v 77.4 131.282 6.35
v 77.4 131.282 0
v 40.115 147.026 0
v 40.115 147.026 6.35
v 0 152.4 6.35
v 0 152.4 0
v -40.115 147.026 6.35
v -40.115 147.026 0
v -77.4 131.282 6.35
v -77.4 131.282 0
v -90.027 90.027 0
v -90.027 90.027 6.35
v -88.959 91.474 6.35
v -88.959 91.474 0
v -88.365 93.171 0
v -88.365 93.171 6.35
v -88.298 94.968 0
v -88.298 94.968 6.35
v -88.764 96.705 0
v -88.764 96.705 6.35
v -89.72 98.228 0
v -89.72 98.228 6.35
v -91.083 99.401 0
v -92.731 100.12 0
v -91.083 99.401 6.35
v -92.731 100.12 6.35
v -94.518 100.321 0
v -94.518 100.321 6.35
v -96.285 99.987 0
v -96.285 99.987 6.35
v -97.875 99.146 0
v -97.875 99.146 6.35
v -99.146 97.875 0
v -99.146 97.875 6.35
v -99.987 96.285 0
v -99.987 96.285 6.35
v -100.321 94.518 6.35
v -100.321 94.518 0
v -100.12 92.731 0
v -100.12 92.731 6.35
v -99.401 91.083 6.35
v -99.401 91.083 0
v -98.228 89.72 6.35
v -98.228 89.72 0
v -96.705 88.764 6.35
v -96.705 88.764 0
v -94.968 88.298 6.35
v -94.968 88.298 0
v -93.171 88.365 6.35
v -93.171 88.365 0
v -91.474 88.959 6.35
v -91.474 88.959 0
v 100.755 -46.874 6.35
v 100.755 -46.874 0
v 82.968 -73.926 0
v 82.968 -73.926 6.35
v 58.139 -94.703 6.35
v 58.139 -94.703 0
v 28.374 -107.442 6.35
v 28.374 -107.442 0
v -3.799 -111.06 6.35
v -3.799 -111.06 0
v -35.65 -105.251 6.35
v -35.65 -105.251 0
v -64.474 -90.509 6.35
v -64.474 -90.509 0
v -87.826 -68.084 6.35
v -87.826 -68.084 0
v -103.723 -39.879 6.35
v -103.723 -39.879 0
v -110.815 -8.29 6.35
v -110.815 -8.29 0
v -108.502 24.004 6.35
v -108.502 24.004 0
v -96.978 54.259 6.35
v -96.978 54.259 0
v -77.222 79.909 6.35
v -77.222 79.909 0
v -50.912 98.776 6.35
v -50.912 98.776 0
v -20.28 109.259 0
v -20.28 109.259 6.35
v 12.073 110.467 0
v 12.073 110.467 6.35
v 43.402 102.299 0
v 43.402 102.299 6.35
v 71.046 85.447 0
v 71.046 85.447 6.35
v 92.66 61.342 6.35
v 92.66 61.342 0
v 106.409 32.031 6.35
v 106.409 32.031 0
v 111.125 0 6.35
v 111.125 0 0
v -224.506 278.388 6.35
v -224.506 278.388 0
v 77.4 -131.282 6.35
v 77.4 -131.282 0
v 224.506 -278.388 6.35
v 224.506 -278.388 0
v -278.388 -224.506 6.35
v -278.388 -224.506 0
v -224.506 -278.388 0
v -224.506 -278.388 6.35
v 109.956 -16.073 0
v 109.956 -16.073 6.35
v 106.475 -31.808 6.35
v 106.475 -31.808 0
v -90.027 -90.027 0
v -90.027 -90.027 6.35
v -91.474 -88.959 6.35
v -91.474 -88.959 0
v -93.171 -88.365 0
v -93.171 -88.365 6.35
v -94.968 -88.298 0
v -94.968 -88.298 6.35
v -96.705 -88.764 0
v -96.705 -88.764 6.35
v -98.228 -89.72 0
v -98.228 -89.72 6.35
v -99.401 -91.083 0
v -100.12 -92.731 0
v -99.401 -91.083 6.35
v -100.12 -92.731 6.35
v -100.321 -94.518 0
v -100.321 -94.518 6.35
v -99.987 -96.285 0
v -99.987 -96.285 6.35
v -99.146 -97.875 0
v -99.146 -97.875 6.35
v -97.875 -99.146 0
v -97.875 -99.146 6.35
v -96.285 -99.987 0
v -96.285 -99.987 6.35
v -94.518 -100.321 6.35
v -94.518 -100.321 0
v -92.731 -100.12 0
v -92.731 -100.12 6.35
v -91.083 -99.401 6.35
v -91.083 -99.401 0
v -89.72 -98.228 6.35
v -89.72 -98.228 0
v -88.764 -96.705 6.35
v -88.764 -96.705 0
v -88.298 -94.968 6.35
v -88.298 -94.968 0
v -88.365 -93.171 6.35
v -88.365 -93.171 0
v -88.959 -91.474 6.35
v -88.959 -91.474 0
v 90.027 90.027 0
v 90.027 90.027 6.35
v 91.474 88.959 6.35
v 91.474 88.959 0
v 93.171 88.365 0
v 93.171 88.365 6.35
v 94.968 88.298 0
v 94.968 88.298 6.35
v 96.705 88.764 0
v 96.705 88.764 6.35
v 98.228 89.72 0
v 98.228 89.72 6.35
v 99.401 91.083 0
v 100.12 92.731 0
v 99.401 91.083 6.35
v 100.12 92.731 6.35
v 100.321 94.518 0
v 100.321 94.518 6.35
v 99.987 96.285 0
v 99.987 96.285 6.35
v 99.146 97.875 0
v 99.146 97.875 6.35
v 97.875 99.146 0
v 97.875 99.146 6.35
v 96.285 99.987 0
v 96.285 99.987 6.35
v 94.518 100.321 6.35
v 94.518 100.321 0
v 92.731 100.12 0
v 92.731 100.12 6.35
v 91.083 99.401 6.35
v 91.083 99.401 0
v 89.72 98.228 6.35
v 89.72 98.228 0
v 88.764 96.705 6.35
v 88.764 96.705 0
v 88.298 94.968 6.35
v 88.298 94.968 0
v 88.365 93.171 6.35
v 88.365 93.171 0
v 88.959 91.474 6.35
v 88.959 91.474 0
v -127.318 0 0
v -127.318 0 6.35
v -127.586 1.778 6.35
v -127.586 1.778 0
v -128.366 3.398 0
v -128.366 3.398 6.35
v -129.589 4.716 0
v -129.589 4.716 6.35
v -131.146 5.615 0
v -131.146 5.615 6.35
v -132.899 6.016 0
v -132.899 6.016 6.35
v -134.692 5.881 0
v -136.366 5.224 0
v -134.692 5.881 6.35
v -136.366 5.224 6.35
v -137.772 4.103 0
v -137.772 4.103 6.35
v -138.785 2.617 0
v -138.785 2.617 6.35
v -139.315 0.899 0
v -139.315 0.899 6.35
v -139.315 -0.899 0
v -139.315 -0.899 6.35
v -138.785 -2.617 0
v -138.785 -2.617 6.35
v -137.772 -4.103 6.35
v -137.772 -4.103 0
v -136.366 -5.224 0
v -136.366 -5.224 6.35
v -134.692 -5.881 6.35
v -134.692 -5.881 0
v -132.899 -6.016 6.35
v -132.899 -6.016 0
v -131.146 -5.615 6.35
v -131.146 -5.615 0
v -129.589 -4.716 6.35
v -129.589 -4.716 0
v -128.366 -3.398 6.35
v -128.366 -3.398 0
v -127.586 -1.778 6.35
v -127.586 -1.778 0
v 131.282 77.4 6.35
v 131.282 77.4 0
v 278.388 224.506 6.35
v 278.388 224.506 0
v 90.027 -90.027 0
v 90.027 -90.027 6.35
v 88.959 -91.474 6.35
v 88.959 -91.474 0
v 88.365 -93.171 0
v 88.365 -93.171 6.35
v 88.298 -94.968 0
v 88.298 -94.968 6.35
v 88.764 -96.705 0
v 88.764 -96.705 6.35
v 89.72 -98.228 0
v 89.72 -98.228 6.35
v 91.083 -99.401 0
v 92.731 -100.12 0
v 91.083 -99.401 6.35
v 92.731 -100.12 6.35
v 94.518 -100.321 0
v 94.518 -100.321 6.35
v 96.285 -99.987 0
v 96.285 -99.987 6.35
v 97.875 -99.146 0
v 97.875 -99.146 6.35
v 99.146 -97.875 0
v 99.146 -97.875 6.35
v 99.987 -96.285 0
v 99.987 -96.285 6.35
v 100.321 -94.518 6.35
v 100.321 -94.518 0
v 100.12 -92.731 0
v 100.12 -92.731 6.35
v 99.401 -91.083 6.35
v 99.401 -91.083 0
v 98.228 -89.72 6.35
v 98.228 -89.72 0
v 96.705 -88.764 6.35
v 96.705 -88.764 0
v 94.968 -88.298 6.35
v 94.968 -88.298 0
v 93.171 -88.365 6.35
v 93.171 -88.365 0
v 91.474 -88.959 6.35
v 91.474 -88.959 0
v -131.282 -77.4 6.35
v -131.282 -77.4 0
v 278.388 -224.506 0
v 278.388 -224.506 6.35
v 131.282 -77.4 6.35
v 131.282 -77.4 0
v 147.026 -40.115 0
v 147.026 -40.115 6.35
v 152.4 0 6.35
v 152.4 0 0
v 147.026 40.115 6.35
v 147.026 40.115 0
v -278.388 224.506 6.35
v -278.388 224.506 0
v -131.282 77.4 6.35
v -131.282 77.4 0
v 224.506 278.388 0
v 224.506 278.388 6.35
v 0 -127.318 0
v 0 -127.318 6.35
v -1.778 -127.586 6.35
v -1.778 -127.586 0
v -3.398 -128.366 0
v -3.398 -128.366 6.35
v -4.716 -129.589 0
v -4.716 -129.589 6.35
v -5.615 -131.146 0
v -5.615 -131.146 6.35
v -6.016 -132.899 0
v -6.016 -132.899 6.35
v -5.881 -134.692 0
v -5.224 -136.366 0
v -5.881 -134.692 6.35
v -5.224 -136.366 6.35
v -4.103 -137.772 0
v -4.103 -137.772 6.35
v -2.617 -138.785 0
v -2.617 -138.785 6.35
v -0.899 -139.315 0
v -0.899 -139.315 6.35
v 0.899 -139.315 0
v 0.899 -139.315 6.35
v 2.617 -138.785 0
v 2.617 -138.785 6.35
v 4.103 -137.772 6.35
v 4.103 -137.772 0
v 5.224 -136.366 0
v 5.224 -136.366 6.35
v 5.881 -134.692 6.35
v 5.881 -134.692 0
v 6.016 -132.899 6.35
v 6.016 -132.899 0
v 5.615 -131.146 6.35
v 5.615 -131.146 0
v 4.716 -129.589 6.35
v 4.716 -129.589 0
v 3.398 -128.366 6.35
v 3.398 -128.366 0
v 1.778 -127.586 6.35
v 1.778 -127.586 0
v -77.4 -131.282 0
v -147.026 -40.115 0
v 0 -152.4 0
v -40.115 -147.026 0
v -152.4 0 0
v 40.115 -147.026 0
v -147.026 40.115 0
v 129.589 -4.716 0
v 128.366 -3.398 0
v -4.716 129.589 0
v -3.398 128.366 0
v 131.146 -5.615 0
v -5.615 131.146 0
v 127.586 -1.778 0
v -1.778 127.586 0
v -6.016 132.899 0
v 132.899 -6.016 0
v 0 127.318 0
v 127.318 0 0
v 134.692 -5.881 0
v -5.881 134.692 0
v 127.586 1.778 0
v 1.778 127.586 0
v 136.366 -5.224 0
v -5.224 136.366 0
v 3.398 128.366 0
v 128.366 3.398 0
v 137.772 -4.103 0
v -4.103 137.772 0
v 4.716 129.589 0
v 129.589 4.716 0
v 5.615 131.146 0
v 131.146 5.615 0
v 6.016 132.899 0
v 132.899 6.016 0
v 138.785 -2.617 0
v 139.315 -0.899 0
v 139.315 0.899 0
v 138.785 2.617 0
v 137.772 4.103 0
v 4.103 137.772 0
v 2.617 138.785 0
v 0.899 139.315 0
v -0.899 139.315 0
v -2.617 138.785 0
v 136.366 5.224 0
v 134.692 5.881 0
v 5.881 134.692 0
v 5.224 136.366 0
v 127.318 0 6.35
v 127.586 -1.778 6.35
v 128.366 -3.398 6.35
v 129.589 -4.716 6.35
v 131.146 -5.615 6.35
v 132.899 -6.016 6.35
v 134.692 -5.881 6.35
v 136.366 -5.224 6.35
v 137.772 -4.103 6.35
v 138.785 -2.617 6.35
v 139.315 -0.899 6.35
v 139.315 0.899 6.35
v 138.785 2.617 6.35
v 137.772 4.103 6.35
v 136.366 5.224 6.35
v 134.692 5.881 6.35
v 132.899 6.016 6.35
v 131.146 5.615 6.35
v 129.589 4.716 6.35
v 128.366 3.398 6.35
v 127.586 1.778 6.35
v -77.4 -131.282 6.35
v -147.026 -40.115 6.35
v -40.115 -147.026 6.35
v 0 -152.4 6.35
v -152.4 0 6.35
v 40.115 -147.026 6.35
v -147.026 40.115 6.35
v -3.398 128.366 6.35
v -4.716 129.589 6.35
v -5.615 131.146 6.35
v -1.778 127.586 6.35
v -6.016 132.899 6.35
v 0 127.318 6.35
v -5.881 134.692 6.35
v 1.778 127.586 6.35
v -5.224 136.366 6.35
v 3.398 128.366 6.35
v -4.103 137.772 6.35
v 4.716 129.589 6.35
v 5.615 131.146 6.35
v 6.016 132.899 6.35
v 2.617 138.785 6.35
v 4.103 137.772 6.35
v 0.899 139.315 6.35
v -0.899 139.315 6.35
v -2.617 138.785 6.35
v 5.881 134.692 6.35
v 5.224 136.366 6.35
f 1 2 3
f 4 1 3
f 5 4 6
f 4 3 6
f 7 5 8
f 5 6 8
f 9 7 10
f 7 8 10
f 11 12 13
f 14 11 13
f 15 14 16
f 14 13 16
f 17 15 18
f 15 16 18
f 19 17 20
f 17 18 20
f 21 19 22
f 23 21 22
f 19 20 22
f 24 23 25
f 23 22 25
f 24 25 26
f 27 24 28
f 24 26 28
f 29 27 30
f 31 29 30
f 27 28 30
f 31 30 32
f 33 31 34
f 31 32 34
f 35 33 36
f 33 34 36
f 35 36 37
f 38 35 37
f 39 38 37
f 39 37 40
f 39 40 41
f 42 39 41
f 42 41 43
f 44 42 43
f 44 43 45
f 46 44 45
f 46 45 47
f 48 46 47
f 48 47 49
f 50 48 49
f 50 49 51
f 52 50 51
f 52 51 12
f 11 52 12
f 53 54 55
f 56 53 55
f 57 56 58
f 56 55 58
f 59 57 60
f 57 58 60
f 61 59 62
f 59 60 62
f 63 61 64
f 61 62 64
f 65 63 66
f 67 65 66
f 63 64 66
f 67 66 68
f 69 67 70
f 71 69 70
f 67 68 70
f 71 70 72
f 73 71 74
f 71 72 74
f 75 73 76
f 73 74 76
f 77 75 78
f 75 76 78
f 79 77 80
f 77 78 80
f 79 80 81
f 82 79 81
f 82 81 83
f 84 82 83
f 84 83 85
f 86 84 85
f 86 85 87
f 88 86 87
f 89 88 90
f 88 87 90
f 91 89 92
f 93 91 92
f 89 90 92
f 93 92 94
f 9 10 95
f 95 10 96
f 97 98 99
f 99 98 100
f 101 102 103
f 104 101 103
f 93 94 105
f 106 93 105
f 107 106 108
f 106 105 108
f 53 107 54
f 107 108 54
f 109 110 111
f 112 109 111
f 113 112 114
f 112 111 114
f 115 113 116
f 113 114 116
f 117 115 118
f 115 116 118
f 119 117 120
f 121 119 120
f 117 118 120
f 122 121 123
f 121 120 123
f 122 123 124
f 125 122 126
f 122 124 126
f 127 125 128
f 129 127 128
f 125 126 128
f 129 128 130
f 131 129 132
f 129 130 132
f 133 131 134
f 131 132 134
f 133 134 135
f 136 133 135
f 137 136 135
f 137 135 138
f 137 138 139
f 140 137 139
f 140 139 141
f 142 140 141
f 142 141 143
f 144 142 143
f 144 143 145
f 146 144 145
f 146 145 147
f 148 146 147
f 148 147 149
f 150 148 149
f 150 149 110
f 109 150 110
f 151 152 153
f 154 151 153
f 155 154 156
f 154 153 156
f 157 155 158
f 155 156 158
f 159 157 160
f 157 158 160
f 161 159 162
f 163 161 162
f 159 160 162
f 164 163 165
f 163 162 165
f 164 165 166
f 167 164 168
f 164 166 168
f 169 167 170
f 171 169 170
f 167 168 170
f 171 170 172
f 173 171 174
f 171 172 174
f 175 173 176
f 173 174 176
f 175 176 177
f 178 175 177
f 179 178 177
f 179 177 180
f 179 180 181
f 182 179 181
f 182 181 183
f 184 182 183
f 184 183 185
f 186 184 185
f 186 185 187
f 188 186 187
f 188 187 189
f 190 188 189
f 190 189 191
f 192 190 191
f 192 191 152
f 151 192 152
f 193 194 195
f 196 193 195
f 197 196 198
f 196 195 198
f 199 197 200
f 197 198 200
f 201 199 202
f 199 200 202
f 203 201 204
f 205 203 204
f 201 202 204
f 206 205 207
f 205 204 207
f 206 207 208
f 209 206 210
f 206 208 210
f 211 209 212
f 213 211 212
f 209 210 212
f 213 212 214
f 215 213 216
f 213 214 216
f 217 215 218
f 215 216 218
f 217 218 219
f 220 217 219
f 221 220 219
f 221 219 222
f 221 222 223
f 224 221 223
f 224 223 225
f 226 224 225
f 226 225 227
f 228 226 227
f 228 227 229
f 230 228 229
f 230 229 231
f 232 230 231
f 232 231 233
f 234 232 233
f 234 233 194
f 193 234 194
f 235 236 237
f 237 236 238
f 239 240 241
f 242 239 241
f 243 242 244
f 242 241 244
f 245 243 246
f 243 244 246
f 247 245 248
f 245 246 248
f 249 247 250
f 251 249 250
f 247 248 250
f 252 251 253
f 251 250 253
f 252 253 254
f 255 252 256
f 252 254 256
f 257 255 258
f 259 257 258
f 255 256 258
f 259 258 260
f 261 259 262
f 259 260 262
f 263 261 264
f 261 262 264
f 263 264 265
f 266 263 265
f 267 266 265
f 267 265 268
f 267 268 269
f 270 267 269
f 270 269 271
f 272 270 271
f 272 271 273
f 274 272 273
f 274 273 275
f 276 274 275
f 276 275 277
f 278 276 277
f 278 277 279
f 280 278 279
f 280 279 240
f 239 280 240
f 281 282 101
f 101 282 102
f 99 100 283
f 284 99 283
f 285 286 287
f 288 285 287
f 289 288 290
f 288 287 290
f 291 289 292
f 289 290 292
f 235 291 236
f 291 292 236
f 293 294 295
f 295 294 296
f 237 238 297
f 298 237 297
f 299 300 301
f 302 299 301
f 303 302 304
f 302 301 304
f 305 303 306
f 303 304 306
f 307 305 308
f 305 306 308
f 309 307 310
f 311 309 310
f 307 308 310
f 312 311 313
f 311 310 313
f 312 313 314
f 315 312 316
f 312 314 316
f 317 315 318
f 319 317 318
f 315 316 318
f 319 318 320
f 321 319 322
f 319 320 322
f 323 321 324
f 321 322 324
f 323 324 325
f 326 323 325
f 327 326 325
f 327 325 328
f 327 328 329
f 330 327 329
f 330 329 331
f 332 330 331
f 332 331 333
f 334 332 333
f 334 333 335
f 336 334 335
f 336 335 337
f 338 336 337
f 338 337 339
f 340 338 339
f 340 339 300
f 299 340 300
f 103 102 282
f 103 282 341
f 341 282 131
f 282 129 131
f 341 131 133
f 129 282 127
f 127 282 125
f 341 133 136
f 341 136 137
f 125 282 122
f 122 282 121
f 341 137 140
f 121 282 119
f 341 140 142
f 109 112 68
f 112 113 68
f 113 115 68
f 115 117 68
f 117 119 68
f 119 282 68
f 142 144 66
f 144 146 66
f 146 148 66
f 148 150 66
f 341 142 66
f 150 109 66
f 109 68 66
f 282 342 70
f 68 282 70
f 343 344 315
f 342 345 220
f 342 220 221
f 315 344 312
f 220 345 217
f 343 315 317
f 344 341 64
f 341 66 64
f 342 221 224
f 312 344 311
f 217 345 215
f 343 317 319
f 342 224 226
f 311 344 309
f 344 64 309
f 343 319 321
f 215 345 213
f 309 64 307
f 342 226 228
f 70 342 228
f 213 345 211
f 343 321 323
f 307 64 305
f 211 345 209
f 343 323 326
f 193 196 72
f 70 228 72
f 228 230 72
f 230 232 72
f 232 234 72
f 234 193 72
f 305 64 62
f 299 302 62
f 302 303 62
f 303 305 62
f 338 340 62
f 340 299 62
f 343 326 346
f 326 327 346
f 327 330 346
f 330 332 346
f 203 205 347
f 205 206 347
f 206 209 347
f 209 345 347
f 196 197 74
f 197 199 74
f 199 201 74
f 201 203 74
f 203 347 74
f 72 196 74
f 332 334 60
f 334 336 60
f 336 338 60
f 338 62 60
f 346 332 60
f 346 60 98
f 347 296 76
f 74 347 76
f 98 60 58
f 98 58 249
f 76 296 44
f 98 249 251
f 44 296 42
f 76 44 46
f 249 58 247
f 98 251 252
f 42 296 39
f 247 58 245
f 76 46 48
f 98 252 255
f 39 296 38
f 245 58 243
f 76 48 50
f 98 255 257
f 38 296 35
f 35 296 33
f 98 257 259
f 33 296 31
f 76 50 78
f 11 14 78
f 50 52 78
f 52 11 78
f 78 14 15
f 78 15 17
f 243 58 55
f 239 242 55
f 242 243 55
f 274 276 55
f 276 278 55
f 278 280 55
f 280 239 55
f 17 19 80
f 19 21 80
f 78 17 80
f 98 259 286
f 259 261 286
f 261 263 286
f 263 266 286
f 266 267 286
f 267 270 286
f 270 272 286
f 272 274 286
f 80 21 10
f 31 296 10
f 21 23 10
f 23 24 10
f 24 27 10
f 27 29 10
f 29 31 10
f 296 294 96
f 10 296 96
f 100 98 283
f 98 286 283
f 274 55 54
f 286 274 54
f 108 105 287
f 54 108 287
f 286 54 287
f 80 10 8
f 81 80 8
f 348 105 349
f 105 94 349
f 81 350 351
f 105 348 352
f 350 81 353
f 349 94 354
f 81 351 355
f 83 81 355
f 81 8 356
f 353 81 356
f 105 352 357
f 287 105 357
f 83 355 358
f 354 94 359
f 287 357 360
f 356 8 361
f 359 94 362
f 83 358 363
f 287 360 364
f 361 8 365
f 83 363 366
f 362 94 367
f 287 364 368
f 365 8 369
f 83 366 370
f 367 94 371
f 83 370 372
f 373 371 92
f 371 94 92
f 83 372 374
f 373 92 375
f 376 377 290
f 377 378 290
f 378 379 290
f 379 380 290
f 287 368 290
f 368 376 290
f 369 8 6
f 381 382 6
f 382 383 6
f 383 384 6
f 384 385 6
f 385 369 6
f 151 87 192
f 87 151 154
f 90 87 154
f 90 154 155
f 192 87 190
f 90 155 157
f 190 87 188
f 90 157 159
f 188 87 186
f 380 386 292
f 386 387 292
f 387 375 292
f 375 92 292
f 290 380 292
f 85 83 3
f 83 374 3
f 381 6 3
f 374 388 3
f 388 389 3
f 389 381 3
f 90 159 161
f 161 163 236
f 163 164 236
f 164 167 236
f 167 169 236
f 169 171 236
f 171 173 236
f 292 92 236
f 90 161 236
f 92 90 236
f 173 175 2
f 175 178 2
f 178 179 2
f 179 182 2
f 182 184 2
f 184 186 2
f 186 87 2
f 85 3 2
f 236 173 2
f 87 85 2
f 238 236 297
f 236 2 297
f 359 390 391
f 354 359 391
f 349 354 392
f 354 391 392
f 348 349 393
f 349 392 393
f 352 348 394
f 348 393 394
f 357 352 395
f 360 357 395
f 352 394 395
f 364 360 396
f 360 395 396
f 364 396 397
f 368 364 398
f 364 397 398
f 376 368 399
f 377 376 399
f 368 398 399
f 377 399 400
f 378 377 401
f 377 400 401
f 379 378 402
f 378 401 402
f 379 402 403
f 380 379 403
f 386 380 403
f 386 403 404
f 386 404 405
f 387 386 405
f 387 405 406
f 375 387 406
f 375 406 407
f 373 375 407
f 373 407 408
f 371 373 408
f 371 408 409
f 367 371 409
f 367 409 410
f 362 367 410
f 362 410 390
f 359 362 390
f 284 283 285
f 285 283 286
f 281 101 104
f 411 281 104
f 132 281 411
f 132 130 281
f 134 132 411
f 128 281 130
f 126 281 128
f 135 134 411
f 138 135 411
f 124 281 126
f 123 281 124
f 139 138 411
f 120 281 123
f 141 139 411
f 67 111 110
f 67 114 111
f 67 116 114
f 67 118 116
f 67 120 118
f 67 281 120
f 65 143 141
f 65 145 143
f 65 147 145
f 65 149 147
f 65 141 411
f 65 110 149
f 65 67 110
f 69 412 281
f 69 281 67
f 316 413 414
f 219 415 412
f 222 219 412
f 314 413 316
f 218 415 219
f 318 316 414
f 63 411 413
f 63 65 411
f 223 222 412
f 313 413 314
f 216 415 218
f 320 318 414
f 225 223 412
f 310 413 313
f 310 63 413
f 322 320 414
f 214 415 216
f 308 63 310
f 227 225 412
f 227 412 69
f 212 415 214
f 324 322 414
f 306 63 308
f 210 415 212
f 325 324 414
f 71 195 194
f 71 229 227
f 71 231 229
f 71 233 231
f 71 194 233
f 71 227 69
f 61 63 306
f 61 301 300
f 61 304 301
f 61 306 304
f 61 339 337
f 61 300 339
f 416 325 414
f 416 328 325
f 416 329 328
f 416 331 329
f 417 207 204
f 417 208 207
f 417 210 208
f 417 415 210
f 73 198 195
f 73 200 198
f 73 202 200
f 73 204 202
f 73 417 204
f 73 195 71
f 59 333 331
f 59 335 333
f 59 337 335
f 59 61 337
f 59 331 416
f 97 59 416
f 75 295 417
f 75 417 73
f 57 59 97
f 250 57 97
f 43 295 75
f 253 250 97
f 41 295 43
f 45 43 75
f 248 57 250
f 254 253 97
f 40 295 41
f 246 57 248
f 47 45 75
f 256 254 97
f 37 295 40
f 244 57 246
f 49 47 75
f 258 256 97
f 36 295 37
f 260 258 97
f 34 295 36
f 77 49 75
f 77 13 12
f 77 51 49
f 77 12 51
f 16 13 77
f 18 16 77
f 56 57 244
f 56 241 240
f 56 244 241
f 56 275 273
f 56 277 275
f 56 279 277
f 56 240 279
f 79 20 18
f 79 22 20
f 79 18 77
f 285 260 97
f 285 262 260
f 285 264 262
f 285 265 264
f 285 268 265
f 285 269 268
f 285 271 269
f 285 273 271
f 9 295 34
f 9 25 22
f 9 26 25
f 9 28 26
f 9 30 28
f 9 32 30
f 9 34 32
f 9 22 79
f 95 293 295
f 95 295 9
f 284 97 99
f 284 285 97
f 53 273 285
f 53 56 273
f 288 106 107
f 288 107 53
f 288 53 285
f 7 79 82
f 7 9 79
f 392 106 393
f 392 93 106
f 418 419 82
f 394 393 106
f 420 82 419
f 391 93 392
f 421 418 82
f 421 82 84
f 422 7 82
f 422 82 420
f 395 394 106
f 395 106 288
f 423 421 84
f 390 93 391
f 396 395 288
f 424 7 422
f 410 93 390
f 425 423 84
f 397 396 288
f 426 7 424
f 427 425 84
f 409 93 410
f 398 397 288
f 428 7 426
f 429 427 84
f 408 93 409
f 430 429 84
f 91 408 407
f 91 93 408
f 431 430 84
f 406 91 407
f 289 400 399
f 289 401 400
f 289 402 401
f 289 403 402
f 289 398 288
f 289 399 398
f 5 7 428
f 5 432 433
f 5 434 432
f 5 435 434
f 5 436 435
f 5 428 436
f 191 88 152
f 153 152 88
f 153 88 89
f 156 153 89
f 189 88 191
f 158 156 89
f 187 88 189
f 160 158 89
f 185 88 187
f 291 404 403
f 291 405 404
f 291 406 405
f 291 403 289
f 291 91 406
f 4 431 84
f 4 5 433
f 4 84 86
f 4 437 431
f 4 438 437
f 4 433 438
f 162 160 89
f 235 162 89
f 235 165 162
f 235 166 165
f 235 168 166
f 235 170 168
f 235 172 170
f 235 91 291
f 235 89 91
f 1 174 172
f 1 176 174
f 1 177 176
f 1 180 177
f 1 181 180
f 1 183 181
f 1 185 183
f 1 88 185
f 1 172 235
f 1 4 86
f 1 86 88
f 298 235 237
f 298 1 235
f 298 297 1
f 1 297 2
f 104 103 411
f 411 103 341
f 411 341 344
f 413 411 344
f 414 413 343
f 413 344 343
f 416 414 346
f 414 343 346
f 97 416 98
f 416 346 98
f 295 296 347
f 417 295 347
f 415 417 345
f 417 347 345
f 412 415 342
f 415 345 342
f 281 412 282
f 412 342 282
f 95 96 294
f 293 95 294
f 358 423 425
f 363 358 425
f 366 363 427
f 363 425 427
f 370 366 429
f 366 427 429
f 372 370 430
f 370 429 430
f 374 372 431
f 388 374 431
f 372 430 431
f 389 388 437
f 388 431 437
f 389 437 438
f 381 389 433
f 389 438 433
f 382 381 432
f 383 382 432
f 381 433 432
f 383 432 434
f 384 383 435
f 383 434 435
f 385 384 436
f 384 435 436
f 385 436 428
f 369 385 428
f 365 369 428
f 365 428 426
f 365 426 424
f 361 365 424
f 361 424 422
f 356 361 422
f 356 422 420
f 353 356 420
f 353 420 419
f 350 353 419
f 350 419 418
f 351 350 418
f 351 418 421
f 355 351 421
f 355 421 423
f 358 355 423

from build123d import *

# Parameters (mm, degrees)
F1_DEPTH        = 6.35
F2_R            = 6.0325
F3_DEPTH        = 25.4
F3_COPIES_COUNT = 8


# Not quite as in the source:
# - a pattern or mirror of a feature is missing from the dataset's text; its kind, count and spacing are read off the source's solid


with BuildPart() as f1:
    # F0 (on Top) → F1 (new body)
    with BuildSketch(Plane.XY):
        with BuildLine():
            Line((-278.3879397531, 224.5064030267), (-131.2819155679, 77.4003788415))
            ThreePointArc((-131.2819155679, 77.4003788415), (-152.4, 0), (-131.2819155679, -77.4003788415))
            Line((-131.2819155679, -77.4003788415), (-278.3879397531, -224.5064030267))
            Line((-278.3879397531, -224.5064030267), (-224.5064030267, -278.3879397531))
            Line((-224.5064030267, -278.3879397531), (-77.4003788415, -131.2819155679))
            ThreePointArc((-77.4003788415, -131.2819155679), (0, -152.4), (77.4003788415, -131.2819155679))
            Line((77.4003788415, -131.2819155679), (224.5064030267, -278.3879397531))
            Line((224.5064030267, -278.3879397531), (278.3879397531, -224.5064030267))
            Line((278.3879397531, -224.5064030267), (131.2819155679, -77.4003788415))
            ThreePointArc((131.2819155679, -77.4003788415), (152.4, 0), (131.2819155679, 77.4003788415))
            Line((131.2819155679, 77.4003788415), (278.3879397531, 224.5064030267))
            Line((278.3879397531, 224.5064030267), (224.5064030267, 278.3879397531))
            Line((224.5064030267, 278.3879397531), (77.4003788415, 131.2819155679))
            ThreePointArc((77.4003788415, 131.2819155679), (0, 152.4), (-77.4003788415, 131.2819155679))
            Line((-77.4003788415, 131.2819155679), (-224.5064030267, 278.3879397531))
            Line((-224.5064030267, 278.3879397531), (-278.3879397531, 224.5064030267))
        make_face()
        with BuildLine():
            ThreePointArc((100.7552507667, -46.8737140403), (-108.5015964547, 24.0035245698), (111.125, 0))
            ThreePointArc((111.125, 0), (108.5015964547, -24.0035245698), (100.7552507667, -46.8737140403))
        make_face(mode=Mode.SUBTRACT)
    extrude(amount=F1_DEPTH)

    # F2 (on face) → F3 (cut)
    with BuildSketch(Plane.XY.offset(6.35)):
        with Locations((-133.35, 0)):
            Circle(F2_R)
    f3 = extrude(amount=-F3_DEPTH, mode=Mode.SUBTRACT)

    # F3_copies: F3 ×8 about axis
    f3_copies_axis = Axis((0, 0, 0), (0, 0, 1))
    for i in range(1, F3_COPIES_COUNT):
        add(f3.rotate(f3_copies_axis, i * 360 / F3_COPIES_COUNT), mode=Mode.SUBTRACT)


solid = f1.part
